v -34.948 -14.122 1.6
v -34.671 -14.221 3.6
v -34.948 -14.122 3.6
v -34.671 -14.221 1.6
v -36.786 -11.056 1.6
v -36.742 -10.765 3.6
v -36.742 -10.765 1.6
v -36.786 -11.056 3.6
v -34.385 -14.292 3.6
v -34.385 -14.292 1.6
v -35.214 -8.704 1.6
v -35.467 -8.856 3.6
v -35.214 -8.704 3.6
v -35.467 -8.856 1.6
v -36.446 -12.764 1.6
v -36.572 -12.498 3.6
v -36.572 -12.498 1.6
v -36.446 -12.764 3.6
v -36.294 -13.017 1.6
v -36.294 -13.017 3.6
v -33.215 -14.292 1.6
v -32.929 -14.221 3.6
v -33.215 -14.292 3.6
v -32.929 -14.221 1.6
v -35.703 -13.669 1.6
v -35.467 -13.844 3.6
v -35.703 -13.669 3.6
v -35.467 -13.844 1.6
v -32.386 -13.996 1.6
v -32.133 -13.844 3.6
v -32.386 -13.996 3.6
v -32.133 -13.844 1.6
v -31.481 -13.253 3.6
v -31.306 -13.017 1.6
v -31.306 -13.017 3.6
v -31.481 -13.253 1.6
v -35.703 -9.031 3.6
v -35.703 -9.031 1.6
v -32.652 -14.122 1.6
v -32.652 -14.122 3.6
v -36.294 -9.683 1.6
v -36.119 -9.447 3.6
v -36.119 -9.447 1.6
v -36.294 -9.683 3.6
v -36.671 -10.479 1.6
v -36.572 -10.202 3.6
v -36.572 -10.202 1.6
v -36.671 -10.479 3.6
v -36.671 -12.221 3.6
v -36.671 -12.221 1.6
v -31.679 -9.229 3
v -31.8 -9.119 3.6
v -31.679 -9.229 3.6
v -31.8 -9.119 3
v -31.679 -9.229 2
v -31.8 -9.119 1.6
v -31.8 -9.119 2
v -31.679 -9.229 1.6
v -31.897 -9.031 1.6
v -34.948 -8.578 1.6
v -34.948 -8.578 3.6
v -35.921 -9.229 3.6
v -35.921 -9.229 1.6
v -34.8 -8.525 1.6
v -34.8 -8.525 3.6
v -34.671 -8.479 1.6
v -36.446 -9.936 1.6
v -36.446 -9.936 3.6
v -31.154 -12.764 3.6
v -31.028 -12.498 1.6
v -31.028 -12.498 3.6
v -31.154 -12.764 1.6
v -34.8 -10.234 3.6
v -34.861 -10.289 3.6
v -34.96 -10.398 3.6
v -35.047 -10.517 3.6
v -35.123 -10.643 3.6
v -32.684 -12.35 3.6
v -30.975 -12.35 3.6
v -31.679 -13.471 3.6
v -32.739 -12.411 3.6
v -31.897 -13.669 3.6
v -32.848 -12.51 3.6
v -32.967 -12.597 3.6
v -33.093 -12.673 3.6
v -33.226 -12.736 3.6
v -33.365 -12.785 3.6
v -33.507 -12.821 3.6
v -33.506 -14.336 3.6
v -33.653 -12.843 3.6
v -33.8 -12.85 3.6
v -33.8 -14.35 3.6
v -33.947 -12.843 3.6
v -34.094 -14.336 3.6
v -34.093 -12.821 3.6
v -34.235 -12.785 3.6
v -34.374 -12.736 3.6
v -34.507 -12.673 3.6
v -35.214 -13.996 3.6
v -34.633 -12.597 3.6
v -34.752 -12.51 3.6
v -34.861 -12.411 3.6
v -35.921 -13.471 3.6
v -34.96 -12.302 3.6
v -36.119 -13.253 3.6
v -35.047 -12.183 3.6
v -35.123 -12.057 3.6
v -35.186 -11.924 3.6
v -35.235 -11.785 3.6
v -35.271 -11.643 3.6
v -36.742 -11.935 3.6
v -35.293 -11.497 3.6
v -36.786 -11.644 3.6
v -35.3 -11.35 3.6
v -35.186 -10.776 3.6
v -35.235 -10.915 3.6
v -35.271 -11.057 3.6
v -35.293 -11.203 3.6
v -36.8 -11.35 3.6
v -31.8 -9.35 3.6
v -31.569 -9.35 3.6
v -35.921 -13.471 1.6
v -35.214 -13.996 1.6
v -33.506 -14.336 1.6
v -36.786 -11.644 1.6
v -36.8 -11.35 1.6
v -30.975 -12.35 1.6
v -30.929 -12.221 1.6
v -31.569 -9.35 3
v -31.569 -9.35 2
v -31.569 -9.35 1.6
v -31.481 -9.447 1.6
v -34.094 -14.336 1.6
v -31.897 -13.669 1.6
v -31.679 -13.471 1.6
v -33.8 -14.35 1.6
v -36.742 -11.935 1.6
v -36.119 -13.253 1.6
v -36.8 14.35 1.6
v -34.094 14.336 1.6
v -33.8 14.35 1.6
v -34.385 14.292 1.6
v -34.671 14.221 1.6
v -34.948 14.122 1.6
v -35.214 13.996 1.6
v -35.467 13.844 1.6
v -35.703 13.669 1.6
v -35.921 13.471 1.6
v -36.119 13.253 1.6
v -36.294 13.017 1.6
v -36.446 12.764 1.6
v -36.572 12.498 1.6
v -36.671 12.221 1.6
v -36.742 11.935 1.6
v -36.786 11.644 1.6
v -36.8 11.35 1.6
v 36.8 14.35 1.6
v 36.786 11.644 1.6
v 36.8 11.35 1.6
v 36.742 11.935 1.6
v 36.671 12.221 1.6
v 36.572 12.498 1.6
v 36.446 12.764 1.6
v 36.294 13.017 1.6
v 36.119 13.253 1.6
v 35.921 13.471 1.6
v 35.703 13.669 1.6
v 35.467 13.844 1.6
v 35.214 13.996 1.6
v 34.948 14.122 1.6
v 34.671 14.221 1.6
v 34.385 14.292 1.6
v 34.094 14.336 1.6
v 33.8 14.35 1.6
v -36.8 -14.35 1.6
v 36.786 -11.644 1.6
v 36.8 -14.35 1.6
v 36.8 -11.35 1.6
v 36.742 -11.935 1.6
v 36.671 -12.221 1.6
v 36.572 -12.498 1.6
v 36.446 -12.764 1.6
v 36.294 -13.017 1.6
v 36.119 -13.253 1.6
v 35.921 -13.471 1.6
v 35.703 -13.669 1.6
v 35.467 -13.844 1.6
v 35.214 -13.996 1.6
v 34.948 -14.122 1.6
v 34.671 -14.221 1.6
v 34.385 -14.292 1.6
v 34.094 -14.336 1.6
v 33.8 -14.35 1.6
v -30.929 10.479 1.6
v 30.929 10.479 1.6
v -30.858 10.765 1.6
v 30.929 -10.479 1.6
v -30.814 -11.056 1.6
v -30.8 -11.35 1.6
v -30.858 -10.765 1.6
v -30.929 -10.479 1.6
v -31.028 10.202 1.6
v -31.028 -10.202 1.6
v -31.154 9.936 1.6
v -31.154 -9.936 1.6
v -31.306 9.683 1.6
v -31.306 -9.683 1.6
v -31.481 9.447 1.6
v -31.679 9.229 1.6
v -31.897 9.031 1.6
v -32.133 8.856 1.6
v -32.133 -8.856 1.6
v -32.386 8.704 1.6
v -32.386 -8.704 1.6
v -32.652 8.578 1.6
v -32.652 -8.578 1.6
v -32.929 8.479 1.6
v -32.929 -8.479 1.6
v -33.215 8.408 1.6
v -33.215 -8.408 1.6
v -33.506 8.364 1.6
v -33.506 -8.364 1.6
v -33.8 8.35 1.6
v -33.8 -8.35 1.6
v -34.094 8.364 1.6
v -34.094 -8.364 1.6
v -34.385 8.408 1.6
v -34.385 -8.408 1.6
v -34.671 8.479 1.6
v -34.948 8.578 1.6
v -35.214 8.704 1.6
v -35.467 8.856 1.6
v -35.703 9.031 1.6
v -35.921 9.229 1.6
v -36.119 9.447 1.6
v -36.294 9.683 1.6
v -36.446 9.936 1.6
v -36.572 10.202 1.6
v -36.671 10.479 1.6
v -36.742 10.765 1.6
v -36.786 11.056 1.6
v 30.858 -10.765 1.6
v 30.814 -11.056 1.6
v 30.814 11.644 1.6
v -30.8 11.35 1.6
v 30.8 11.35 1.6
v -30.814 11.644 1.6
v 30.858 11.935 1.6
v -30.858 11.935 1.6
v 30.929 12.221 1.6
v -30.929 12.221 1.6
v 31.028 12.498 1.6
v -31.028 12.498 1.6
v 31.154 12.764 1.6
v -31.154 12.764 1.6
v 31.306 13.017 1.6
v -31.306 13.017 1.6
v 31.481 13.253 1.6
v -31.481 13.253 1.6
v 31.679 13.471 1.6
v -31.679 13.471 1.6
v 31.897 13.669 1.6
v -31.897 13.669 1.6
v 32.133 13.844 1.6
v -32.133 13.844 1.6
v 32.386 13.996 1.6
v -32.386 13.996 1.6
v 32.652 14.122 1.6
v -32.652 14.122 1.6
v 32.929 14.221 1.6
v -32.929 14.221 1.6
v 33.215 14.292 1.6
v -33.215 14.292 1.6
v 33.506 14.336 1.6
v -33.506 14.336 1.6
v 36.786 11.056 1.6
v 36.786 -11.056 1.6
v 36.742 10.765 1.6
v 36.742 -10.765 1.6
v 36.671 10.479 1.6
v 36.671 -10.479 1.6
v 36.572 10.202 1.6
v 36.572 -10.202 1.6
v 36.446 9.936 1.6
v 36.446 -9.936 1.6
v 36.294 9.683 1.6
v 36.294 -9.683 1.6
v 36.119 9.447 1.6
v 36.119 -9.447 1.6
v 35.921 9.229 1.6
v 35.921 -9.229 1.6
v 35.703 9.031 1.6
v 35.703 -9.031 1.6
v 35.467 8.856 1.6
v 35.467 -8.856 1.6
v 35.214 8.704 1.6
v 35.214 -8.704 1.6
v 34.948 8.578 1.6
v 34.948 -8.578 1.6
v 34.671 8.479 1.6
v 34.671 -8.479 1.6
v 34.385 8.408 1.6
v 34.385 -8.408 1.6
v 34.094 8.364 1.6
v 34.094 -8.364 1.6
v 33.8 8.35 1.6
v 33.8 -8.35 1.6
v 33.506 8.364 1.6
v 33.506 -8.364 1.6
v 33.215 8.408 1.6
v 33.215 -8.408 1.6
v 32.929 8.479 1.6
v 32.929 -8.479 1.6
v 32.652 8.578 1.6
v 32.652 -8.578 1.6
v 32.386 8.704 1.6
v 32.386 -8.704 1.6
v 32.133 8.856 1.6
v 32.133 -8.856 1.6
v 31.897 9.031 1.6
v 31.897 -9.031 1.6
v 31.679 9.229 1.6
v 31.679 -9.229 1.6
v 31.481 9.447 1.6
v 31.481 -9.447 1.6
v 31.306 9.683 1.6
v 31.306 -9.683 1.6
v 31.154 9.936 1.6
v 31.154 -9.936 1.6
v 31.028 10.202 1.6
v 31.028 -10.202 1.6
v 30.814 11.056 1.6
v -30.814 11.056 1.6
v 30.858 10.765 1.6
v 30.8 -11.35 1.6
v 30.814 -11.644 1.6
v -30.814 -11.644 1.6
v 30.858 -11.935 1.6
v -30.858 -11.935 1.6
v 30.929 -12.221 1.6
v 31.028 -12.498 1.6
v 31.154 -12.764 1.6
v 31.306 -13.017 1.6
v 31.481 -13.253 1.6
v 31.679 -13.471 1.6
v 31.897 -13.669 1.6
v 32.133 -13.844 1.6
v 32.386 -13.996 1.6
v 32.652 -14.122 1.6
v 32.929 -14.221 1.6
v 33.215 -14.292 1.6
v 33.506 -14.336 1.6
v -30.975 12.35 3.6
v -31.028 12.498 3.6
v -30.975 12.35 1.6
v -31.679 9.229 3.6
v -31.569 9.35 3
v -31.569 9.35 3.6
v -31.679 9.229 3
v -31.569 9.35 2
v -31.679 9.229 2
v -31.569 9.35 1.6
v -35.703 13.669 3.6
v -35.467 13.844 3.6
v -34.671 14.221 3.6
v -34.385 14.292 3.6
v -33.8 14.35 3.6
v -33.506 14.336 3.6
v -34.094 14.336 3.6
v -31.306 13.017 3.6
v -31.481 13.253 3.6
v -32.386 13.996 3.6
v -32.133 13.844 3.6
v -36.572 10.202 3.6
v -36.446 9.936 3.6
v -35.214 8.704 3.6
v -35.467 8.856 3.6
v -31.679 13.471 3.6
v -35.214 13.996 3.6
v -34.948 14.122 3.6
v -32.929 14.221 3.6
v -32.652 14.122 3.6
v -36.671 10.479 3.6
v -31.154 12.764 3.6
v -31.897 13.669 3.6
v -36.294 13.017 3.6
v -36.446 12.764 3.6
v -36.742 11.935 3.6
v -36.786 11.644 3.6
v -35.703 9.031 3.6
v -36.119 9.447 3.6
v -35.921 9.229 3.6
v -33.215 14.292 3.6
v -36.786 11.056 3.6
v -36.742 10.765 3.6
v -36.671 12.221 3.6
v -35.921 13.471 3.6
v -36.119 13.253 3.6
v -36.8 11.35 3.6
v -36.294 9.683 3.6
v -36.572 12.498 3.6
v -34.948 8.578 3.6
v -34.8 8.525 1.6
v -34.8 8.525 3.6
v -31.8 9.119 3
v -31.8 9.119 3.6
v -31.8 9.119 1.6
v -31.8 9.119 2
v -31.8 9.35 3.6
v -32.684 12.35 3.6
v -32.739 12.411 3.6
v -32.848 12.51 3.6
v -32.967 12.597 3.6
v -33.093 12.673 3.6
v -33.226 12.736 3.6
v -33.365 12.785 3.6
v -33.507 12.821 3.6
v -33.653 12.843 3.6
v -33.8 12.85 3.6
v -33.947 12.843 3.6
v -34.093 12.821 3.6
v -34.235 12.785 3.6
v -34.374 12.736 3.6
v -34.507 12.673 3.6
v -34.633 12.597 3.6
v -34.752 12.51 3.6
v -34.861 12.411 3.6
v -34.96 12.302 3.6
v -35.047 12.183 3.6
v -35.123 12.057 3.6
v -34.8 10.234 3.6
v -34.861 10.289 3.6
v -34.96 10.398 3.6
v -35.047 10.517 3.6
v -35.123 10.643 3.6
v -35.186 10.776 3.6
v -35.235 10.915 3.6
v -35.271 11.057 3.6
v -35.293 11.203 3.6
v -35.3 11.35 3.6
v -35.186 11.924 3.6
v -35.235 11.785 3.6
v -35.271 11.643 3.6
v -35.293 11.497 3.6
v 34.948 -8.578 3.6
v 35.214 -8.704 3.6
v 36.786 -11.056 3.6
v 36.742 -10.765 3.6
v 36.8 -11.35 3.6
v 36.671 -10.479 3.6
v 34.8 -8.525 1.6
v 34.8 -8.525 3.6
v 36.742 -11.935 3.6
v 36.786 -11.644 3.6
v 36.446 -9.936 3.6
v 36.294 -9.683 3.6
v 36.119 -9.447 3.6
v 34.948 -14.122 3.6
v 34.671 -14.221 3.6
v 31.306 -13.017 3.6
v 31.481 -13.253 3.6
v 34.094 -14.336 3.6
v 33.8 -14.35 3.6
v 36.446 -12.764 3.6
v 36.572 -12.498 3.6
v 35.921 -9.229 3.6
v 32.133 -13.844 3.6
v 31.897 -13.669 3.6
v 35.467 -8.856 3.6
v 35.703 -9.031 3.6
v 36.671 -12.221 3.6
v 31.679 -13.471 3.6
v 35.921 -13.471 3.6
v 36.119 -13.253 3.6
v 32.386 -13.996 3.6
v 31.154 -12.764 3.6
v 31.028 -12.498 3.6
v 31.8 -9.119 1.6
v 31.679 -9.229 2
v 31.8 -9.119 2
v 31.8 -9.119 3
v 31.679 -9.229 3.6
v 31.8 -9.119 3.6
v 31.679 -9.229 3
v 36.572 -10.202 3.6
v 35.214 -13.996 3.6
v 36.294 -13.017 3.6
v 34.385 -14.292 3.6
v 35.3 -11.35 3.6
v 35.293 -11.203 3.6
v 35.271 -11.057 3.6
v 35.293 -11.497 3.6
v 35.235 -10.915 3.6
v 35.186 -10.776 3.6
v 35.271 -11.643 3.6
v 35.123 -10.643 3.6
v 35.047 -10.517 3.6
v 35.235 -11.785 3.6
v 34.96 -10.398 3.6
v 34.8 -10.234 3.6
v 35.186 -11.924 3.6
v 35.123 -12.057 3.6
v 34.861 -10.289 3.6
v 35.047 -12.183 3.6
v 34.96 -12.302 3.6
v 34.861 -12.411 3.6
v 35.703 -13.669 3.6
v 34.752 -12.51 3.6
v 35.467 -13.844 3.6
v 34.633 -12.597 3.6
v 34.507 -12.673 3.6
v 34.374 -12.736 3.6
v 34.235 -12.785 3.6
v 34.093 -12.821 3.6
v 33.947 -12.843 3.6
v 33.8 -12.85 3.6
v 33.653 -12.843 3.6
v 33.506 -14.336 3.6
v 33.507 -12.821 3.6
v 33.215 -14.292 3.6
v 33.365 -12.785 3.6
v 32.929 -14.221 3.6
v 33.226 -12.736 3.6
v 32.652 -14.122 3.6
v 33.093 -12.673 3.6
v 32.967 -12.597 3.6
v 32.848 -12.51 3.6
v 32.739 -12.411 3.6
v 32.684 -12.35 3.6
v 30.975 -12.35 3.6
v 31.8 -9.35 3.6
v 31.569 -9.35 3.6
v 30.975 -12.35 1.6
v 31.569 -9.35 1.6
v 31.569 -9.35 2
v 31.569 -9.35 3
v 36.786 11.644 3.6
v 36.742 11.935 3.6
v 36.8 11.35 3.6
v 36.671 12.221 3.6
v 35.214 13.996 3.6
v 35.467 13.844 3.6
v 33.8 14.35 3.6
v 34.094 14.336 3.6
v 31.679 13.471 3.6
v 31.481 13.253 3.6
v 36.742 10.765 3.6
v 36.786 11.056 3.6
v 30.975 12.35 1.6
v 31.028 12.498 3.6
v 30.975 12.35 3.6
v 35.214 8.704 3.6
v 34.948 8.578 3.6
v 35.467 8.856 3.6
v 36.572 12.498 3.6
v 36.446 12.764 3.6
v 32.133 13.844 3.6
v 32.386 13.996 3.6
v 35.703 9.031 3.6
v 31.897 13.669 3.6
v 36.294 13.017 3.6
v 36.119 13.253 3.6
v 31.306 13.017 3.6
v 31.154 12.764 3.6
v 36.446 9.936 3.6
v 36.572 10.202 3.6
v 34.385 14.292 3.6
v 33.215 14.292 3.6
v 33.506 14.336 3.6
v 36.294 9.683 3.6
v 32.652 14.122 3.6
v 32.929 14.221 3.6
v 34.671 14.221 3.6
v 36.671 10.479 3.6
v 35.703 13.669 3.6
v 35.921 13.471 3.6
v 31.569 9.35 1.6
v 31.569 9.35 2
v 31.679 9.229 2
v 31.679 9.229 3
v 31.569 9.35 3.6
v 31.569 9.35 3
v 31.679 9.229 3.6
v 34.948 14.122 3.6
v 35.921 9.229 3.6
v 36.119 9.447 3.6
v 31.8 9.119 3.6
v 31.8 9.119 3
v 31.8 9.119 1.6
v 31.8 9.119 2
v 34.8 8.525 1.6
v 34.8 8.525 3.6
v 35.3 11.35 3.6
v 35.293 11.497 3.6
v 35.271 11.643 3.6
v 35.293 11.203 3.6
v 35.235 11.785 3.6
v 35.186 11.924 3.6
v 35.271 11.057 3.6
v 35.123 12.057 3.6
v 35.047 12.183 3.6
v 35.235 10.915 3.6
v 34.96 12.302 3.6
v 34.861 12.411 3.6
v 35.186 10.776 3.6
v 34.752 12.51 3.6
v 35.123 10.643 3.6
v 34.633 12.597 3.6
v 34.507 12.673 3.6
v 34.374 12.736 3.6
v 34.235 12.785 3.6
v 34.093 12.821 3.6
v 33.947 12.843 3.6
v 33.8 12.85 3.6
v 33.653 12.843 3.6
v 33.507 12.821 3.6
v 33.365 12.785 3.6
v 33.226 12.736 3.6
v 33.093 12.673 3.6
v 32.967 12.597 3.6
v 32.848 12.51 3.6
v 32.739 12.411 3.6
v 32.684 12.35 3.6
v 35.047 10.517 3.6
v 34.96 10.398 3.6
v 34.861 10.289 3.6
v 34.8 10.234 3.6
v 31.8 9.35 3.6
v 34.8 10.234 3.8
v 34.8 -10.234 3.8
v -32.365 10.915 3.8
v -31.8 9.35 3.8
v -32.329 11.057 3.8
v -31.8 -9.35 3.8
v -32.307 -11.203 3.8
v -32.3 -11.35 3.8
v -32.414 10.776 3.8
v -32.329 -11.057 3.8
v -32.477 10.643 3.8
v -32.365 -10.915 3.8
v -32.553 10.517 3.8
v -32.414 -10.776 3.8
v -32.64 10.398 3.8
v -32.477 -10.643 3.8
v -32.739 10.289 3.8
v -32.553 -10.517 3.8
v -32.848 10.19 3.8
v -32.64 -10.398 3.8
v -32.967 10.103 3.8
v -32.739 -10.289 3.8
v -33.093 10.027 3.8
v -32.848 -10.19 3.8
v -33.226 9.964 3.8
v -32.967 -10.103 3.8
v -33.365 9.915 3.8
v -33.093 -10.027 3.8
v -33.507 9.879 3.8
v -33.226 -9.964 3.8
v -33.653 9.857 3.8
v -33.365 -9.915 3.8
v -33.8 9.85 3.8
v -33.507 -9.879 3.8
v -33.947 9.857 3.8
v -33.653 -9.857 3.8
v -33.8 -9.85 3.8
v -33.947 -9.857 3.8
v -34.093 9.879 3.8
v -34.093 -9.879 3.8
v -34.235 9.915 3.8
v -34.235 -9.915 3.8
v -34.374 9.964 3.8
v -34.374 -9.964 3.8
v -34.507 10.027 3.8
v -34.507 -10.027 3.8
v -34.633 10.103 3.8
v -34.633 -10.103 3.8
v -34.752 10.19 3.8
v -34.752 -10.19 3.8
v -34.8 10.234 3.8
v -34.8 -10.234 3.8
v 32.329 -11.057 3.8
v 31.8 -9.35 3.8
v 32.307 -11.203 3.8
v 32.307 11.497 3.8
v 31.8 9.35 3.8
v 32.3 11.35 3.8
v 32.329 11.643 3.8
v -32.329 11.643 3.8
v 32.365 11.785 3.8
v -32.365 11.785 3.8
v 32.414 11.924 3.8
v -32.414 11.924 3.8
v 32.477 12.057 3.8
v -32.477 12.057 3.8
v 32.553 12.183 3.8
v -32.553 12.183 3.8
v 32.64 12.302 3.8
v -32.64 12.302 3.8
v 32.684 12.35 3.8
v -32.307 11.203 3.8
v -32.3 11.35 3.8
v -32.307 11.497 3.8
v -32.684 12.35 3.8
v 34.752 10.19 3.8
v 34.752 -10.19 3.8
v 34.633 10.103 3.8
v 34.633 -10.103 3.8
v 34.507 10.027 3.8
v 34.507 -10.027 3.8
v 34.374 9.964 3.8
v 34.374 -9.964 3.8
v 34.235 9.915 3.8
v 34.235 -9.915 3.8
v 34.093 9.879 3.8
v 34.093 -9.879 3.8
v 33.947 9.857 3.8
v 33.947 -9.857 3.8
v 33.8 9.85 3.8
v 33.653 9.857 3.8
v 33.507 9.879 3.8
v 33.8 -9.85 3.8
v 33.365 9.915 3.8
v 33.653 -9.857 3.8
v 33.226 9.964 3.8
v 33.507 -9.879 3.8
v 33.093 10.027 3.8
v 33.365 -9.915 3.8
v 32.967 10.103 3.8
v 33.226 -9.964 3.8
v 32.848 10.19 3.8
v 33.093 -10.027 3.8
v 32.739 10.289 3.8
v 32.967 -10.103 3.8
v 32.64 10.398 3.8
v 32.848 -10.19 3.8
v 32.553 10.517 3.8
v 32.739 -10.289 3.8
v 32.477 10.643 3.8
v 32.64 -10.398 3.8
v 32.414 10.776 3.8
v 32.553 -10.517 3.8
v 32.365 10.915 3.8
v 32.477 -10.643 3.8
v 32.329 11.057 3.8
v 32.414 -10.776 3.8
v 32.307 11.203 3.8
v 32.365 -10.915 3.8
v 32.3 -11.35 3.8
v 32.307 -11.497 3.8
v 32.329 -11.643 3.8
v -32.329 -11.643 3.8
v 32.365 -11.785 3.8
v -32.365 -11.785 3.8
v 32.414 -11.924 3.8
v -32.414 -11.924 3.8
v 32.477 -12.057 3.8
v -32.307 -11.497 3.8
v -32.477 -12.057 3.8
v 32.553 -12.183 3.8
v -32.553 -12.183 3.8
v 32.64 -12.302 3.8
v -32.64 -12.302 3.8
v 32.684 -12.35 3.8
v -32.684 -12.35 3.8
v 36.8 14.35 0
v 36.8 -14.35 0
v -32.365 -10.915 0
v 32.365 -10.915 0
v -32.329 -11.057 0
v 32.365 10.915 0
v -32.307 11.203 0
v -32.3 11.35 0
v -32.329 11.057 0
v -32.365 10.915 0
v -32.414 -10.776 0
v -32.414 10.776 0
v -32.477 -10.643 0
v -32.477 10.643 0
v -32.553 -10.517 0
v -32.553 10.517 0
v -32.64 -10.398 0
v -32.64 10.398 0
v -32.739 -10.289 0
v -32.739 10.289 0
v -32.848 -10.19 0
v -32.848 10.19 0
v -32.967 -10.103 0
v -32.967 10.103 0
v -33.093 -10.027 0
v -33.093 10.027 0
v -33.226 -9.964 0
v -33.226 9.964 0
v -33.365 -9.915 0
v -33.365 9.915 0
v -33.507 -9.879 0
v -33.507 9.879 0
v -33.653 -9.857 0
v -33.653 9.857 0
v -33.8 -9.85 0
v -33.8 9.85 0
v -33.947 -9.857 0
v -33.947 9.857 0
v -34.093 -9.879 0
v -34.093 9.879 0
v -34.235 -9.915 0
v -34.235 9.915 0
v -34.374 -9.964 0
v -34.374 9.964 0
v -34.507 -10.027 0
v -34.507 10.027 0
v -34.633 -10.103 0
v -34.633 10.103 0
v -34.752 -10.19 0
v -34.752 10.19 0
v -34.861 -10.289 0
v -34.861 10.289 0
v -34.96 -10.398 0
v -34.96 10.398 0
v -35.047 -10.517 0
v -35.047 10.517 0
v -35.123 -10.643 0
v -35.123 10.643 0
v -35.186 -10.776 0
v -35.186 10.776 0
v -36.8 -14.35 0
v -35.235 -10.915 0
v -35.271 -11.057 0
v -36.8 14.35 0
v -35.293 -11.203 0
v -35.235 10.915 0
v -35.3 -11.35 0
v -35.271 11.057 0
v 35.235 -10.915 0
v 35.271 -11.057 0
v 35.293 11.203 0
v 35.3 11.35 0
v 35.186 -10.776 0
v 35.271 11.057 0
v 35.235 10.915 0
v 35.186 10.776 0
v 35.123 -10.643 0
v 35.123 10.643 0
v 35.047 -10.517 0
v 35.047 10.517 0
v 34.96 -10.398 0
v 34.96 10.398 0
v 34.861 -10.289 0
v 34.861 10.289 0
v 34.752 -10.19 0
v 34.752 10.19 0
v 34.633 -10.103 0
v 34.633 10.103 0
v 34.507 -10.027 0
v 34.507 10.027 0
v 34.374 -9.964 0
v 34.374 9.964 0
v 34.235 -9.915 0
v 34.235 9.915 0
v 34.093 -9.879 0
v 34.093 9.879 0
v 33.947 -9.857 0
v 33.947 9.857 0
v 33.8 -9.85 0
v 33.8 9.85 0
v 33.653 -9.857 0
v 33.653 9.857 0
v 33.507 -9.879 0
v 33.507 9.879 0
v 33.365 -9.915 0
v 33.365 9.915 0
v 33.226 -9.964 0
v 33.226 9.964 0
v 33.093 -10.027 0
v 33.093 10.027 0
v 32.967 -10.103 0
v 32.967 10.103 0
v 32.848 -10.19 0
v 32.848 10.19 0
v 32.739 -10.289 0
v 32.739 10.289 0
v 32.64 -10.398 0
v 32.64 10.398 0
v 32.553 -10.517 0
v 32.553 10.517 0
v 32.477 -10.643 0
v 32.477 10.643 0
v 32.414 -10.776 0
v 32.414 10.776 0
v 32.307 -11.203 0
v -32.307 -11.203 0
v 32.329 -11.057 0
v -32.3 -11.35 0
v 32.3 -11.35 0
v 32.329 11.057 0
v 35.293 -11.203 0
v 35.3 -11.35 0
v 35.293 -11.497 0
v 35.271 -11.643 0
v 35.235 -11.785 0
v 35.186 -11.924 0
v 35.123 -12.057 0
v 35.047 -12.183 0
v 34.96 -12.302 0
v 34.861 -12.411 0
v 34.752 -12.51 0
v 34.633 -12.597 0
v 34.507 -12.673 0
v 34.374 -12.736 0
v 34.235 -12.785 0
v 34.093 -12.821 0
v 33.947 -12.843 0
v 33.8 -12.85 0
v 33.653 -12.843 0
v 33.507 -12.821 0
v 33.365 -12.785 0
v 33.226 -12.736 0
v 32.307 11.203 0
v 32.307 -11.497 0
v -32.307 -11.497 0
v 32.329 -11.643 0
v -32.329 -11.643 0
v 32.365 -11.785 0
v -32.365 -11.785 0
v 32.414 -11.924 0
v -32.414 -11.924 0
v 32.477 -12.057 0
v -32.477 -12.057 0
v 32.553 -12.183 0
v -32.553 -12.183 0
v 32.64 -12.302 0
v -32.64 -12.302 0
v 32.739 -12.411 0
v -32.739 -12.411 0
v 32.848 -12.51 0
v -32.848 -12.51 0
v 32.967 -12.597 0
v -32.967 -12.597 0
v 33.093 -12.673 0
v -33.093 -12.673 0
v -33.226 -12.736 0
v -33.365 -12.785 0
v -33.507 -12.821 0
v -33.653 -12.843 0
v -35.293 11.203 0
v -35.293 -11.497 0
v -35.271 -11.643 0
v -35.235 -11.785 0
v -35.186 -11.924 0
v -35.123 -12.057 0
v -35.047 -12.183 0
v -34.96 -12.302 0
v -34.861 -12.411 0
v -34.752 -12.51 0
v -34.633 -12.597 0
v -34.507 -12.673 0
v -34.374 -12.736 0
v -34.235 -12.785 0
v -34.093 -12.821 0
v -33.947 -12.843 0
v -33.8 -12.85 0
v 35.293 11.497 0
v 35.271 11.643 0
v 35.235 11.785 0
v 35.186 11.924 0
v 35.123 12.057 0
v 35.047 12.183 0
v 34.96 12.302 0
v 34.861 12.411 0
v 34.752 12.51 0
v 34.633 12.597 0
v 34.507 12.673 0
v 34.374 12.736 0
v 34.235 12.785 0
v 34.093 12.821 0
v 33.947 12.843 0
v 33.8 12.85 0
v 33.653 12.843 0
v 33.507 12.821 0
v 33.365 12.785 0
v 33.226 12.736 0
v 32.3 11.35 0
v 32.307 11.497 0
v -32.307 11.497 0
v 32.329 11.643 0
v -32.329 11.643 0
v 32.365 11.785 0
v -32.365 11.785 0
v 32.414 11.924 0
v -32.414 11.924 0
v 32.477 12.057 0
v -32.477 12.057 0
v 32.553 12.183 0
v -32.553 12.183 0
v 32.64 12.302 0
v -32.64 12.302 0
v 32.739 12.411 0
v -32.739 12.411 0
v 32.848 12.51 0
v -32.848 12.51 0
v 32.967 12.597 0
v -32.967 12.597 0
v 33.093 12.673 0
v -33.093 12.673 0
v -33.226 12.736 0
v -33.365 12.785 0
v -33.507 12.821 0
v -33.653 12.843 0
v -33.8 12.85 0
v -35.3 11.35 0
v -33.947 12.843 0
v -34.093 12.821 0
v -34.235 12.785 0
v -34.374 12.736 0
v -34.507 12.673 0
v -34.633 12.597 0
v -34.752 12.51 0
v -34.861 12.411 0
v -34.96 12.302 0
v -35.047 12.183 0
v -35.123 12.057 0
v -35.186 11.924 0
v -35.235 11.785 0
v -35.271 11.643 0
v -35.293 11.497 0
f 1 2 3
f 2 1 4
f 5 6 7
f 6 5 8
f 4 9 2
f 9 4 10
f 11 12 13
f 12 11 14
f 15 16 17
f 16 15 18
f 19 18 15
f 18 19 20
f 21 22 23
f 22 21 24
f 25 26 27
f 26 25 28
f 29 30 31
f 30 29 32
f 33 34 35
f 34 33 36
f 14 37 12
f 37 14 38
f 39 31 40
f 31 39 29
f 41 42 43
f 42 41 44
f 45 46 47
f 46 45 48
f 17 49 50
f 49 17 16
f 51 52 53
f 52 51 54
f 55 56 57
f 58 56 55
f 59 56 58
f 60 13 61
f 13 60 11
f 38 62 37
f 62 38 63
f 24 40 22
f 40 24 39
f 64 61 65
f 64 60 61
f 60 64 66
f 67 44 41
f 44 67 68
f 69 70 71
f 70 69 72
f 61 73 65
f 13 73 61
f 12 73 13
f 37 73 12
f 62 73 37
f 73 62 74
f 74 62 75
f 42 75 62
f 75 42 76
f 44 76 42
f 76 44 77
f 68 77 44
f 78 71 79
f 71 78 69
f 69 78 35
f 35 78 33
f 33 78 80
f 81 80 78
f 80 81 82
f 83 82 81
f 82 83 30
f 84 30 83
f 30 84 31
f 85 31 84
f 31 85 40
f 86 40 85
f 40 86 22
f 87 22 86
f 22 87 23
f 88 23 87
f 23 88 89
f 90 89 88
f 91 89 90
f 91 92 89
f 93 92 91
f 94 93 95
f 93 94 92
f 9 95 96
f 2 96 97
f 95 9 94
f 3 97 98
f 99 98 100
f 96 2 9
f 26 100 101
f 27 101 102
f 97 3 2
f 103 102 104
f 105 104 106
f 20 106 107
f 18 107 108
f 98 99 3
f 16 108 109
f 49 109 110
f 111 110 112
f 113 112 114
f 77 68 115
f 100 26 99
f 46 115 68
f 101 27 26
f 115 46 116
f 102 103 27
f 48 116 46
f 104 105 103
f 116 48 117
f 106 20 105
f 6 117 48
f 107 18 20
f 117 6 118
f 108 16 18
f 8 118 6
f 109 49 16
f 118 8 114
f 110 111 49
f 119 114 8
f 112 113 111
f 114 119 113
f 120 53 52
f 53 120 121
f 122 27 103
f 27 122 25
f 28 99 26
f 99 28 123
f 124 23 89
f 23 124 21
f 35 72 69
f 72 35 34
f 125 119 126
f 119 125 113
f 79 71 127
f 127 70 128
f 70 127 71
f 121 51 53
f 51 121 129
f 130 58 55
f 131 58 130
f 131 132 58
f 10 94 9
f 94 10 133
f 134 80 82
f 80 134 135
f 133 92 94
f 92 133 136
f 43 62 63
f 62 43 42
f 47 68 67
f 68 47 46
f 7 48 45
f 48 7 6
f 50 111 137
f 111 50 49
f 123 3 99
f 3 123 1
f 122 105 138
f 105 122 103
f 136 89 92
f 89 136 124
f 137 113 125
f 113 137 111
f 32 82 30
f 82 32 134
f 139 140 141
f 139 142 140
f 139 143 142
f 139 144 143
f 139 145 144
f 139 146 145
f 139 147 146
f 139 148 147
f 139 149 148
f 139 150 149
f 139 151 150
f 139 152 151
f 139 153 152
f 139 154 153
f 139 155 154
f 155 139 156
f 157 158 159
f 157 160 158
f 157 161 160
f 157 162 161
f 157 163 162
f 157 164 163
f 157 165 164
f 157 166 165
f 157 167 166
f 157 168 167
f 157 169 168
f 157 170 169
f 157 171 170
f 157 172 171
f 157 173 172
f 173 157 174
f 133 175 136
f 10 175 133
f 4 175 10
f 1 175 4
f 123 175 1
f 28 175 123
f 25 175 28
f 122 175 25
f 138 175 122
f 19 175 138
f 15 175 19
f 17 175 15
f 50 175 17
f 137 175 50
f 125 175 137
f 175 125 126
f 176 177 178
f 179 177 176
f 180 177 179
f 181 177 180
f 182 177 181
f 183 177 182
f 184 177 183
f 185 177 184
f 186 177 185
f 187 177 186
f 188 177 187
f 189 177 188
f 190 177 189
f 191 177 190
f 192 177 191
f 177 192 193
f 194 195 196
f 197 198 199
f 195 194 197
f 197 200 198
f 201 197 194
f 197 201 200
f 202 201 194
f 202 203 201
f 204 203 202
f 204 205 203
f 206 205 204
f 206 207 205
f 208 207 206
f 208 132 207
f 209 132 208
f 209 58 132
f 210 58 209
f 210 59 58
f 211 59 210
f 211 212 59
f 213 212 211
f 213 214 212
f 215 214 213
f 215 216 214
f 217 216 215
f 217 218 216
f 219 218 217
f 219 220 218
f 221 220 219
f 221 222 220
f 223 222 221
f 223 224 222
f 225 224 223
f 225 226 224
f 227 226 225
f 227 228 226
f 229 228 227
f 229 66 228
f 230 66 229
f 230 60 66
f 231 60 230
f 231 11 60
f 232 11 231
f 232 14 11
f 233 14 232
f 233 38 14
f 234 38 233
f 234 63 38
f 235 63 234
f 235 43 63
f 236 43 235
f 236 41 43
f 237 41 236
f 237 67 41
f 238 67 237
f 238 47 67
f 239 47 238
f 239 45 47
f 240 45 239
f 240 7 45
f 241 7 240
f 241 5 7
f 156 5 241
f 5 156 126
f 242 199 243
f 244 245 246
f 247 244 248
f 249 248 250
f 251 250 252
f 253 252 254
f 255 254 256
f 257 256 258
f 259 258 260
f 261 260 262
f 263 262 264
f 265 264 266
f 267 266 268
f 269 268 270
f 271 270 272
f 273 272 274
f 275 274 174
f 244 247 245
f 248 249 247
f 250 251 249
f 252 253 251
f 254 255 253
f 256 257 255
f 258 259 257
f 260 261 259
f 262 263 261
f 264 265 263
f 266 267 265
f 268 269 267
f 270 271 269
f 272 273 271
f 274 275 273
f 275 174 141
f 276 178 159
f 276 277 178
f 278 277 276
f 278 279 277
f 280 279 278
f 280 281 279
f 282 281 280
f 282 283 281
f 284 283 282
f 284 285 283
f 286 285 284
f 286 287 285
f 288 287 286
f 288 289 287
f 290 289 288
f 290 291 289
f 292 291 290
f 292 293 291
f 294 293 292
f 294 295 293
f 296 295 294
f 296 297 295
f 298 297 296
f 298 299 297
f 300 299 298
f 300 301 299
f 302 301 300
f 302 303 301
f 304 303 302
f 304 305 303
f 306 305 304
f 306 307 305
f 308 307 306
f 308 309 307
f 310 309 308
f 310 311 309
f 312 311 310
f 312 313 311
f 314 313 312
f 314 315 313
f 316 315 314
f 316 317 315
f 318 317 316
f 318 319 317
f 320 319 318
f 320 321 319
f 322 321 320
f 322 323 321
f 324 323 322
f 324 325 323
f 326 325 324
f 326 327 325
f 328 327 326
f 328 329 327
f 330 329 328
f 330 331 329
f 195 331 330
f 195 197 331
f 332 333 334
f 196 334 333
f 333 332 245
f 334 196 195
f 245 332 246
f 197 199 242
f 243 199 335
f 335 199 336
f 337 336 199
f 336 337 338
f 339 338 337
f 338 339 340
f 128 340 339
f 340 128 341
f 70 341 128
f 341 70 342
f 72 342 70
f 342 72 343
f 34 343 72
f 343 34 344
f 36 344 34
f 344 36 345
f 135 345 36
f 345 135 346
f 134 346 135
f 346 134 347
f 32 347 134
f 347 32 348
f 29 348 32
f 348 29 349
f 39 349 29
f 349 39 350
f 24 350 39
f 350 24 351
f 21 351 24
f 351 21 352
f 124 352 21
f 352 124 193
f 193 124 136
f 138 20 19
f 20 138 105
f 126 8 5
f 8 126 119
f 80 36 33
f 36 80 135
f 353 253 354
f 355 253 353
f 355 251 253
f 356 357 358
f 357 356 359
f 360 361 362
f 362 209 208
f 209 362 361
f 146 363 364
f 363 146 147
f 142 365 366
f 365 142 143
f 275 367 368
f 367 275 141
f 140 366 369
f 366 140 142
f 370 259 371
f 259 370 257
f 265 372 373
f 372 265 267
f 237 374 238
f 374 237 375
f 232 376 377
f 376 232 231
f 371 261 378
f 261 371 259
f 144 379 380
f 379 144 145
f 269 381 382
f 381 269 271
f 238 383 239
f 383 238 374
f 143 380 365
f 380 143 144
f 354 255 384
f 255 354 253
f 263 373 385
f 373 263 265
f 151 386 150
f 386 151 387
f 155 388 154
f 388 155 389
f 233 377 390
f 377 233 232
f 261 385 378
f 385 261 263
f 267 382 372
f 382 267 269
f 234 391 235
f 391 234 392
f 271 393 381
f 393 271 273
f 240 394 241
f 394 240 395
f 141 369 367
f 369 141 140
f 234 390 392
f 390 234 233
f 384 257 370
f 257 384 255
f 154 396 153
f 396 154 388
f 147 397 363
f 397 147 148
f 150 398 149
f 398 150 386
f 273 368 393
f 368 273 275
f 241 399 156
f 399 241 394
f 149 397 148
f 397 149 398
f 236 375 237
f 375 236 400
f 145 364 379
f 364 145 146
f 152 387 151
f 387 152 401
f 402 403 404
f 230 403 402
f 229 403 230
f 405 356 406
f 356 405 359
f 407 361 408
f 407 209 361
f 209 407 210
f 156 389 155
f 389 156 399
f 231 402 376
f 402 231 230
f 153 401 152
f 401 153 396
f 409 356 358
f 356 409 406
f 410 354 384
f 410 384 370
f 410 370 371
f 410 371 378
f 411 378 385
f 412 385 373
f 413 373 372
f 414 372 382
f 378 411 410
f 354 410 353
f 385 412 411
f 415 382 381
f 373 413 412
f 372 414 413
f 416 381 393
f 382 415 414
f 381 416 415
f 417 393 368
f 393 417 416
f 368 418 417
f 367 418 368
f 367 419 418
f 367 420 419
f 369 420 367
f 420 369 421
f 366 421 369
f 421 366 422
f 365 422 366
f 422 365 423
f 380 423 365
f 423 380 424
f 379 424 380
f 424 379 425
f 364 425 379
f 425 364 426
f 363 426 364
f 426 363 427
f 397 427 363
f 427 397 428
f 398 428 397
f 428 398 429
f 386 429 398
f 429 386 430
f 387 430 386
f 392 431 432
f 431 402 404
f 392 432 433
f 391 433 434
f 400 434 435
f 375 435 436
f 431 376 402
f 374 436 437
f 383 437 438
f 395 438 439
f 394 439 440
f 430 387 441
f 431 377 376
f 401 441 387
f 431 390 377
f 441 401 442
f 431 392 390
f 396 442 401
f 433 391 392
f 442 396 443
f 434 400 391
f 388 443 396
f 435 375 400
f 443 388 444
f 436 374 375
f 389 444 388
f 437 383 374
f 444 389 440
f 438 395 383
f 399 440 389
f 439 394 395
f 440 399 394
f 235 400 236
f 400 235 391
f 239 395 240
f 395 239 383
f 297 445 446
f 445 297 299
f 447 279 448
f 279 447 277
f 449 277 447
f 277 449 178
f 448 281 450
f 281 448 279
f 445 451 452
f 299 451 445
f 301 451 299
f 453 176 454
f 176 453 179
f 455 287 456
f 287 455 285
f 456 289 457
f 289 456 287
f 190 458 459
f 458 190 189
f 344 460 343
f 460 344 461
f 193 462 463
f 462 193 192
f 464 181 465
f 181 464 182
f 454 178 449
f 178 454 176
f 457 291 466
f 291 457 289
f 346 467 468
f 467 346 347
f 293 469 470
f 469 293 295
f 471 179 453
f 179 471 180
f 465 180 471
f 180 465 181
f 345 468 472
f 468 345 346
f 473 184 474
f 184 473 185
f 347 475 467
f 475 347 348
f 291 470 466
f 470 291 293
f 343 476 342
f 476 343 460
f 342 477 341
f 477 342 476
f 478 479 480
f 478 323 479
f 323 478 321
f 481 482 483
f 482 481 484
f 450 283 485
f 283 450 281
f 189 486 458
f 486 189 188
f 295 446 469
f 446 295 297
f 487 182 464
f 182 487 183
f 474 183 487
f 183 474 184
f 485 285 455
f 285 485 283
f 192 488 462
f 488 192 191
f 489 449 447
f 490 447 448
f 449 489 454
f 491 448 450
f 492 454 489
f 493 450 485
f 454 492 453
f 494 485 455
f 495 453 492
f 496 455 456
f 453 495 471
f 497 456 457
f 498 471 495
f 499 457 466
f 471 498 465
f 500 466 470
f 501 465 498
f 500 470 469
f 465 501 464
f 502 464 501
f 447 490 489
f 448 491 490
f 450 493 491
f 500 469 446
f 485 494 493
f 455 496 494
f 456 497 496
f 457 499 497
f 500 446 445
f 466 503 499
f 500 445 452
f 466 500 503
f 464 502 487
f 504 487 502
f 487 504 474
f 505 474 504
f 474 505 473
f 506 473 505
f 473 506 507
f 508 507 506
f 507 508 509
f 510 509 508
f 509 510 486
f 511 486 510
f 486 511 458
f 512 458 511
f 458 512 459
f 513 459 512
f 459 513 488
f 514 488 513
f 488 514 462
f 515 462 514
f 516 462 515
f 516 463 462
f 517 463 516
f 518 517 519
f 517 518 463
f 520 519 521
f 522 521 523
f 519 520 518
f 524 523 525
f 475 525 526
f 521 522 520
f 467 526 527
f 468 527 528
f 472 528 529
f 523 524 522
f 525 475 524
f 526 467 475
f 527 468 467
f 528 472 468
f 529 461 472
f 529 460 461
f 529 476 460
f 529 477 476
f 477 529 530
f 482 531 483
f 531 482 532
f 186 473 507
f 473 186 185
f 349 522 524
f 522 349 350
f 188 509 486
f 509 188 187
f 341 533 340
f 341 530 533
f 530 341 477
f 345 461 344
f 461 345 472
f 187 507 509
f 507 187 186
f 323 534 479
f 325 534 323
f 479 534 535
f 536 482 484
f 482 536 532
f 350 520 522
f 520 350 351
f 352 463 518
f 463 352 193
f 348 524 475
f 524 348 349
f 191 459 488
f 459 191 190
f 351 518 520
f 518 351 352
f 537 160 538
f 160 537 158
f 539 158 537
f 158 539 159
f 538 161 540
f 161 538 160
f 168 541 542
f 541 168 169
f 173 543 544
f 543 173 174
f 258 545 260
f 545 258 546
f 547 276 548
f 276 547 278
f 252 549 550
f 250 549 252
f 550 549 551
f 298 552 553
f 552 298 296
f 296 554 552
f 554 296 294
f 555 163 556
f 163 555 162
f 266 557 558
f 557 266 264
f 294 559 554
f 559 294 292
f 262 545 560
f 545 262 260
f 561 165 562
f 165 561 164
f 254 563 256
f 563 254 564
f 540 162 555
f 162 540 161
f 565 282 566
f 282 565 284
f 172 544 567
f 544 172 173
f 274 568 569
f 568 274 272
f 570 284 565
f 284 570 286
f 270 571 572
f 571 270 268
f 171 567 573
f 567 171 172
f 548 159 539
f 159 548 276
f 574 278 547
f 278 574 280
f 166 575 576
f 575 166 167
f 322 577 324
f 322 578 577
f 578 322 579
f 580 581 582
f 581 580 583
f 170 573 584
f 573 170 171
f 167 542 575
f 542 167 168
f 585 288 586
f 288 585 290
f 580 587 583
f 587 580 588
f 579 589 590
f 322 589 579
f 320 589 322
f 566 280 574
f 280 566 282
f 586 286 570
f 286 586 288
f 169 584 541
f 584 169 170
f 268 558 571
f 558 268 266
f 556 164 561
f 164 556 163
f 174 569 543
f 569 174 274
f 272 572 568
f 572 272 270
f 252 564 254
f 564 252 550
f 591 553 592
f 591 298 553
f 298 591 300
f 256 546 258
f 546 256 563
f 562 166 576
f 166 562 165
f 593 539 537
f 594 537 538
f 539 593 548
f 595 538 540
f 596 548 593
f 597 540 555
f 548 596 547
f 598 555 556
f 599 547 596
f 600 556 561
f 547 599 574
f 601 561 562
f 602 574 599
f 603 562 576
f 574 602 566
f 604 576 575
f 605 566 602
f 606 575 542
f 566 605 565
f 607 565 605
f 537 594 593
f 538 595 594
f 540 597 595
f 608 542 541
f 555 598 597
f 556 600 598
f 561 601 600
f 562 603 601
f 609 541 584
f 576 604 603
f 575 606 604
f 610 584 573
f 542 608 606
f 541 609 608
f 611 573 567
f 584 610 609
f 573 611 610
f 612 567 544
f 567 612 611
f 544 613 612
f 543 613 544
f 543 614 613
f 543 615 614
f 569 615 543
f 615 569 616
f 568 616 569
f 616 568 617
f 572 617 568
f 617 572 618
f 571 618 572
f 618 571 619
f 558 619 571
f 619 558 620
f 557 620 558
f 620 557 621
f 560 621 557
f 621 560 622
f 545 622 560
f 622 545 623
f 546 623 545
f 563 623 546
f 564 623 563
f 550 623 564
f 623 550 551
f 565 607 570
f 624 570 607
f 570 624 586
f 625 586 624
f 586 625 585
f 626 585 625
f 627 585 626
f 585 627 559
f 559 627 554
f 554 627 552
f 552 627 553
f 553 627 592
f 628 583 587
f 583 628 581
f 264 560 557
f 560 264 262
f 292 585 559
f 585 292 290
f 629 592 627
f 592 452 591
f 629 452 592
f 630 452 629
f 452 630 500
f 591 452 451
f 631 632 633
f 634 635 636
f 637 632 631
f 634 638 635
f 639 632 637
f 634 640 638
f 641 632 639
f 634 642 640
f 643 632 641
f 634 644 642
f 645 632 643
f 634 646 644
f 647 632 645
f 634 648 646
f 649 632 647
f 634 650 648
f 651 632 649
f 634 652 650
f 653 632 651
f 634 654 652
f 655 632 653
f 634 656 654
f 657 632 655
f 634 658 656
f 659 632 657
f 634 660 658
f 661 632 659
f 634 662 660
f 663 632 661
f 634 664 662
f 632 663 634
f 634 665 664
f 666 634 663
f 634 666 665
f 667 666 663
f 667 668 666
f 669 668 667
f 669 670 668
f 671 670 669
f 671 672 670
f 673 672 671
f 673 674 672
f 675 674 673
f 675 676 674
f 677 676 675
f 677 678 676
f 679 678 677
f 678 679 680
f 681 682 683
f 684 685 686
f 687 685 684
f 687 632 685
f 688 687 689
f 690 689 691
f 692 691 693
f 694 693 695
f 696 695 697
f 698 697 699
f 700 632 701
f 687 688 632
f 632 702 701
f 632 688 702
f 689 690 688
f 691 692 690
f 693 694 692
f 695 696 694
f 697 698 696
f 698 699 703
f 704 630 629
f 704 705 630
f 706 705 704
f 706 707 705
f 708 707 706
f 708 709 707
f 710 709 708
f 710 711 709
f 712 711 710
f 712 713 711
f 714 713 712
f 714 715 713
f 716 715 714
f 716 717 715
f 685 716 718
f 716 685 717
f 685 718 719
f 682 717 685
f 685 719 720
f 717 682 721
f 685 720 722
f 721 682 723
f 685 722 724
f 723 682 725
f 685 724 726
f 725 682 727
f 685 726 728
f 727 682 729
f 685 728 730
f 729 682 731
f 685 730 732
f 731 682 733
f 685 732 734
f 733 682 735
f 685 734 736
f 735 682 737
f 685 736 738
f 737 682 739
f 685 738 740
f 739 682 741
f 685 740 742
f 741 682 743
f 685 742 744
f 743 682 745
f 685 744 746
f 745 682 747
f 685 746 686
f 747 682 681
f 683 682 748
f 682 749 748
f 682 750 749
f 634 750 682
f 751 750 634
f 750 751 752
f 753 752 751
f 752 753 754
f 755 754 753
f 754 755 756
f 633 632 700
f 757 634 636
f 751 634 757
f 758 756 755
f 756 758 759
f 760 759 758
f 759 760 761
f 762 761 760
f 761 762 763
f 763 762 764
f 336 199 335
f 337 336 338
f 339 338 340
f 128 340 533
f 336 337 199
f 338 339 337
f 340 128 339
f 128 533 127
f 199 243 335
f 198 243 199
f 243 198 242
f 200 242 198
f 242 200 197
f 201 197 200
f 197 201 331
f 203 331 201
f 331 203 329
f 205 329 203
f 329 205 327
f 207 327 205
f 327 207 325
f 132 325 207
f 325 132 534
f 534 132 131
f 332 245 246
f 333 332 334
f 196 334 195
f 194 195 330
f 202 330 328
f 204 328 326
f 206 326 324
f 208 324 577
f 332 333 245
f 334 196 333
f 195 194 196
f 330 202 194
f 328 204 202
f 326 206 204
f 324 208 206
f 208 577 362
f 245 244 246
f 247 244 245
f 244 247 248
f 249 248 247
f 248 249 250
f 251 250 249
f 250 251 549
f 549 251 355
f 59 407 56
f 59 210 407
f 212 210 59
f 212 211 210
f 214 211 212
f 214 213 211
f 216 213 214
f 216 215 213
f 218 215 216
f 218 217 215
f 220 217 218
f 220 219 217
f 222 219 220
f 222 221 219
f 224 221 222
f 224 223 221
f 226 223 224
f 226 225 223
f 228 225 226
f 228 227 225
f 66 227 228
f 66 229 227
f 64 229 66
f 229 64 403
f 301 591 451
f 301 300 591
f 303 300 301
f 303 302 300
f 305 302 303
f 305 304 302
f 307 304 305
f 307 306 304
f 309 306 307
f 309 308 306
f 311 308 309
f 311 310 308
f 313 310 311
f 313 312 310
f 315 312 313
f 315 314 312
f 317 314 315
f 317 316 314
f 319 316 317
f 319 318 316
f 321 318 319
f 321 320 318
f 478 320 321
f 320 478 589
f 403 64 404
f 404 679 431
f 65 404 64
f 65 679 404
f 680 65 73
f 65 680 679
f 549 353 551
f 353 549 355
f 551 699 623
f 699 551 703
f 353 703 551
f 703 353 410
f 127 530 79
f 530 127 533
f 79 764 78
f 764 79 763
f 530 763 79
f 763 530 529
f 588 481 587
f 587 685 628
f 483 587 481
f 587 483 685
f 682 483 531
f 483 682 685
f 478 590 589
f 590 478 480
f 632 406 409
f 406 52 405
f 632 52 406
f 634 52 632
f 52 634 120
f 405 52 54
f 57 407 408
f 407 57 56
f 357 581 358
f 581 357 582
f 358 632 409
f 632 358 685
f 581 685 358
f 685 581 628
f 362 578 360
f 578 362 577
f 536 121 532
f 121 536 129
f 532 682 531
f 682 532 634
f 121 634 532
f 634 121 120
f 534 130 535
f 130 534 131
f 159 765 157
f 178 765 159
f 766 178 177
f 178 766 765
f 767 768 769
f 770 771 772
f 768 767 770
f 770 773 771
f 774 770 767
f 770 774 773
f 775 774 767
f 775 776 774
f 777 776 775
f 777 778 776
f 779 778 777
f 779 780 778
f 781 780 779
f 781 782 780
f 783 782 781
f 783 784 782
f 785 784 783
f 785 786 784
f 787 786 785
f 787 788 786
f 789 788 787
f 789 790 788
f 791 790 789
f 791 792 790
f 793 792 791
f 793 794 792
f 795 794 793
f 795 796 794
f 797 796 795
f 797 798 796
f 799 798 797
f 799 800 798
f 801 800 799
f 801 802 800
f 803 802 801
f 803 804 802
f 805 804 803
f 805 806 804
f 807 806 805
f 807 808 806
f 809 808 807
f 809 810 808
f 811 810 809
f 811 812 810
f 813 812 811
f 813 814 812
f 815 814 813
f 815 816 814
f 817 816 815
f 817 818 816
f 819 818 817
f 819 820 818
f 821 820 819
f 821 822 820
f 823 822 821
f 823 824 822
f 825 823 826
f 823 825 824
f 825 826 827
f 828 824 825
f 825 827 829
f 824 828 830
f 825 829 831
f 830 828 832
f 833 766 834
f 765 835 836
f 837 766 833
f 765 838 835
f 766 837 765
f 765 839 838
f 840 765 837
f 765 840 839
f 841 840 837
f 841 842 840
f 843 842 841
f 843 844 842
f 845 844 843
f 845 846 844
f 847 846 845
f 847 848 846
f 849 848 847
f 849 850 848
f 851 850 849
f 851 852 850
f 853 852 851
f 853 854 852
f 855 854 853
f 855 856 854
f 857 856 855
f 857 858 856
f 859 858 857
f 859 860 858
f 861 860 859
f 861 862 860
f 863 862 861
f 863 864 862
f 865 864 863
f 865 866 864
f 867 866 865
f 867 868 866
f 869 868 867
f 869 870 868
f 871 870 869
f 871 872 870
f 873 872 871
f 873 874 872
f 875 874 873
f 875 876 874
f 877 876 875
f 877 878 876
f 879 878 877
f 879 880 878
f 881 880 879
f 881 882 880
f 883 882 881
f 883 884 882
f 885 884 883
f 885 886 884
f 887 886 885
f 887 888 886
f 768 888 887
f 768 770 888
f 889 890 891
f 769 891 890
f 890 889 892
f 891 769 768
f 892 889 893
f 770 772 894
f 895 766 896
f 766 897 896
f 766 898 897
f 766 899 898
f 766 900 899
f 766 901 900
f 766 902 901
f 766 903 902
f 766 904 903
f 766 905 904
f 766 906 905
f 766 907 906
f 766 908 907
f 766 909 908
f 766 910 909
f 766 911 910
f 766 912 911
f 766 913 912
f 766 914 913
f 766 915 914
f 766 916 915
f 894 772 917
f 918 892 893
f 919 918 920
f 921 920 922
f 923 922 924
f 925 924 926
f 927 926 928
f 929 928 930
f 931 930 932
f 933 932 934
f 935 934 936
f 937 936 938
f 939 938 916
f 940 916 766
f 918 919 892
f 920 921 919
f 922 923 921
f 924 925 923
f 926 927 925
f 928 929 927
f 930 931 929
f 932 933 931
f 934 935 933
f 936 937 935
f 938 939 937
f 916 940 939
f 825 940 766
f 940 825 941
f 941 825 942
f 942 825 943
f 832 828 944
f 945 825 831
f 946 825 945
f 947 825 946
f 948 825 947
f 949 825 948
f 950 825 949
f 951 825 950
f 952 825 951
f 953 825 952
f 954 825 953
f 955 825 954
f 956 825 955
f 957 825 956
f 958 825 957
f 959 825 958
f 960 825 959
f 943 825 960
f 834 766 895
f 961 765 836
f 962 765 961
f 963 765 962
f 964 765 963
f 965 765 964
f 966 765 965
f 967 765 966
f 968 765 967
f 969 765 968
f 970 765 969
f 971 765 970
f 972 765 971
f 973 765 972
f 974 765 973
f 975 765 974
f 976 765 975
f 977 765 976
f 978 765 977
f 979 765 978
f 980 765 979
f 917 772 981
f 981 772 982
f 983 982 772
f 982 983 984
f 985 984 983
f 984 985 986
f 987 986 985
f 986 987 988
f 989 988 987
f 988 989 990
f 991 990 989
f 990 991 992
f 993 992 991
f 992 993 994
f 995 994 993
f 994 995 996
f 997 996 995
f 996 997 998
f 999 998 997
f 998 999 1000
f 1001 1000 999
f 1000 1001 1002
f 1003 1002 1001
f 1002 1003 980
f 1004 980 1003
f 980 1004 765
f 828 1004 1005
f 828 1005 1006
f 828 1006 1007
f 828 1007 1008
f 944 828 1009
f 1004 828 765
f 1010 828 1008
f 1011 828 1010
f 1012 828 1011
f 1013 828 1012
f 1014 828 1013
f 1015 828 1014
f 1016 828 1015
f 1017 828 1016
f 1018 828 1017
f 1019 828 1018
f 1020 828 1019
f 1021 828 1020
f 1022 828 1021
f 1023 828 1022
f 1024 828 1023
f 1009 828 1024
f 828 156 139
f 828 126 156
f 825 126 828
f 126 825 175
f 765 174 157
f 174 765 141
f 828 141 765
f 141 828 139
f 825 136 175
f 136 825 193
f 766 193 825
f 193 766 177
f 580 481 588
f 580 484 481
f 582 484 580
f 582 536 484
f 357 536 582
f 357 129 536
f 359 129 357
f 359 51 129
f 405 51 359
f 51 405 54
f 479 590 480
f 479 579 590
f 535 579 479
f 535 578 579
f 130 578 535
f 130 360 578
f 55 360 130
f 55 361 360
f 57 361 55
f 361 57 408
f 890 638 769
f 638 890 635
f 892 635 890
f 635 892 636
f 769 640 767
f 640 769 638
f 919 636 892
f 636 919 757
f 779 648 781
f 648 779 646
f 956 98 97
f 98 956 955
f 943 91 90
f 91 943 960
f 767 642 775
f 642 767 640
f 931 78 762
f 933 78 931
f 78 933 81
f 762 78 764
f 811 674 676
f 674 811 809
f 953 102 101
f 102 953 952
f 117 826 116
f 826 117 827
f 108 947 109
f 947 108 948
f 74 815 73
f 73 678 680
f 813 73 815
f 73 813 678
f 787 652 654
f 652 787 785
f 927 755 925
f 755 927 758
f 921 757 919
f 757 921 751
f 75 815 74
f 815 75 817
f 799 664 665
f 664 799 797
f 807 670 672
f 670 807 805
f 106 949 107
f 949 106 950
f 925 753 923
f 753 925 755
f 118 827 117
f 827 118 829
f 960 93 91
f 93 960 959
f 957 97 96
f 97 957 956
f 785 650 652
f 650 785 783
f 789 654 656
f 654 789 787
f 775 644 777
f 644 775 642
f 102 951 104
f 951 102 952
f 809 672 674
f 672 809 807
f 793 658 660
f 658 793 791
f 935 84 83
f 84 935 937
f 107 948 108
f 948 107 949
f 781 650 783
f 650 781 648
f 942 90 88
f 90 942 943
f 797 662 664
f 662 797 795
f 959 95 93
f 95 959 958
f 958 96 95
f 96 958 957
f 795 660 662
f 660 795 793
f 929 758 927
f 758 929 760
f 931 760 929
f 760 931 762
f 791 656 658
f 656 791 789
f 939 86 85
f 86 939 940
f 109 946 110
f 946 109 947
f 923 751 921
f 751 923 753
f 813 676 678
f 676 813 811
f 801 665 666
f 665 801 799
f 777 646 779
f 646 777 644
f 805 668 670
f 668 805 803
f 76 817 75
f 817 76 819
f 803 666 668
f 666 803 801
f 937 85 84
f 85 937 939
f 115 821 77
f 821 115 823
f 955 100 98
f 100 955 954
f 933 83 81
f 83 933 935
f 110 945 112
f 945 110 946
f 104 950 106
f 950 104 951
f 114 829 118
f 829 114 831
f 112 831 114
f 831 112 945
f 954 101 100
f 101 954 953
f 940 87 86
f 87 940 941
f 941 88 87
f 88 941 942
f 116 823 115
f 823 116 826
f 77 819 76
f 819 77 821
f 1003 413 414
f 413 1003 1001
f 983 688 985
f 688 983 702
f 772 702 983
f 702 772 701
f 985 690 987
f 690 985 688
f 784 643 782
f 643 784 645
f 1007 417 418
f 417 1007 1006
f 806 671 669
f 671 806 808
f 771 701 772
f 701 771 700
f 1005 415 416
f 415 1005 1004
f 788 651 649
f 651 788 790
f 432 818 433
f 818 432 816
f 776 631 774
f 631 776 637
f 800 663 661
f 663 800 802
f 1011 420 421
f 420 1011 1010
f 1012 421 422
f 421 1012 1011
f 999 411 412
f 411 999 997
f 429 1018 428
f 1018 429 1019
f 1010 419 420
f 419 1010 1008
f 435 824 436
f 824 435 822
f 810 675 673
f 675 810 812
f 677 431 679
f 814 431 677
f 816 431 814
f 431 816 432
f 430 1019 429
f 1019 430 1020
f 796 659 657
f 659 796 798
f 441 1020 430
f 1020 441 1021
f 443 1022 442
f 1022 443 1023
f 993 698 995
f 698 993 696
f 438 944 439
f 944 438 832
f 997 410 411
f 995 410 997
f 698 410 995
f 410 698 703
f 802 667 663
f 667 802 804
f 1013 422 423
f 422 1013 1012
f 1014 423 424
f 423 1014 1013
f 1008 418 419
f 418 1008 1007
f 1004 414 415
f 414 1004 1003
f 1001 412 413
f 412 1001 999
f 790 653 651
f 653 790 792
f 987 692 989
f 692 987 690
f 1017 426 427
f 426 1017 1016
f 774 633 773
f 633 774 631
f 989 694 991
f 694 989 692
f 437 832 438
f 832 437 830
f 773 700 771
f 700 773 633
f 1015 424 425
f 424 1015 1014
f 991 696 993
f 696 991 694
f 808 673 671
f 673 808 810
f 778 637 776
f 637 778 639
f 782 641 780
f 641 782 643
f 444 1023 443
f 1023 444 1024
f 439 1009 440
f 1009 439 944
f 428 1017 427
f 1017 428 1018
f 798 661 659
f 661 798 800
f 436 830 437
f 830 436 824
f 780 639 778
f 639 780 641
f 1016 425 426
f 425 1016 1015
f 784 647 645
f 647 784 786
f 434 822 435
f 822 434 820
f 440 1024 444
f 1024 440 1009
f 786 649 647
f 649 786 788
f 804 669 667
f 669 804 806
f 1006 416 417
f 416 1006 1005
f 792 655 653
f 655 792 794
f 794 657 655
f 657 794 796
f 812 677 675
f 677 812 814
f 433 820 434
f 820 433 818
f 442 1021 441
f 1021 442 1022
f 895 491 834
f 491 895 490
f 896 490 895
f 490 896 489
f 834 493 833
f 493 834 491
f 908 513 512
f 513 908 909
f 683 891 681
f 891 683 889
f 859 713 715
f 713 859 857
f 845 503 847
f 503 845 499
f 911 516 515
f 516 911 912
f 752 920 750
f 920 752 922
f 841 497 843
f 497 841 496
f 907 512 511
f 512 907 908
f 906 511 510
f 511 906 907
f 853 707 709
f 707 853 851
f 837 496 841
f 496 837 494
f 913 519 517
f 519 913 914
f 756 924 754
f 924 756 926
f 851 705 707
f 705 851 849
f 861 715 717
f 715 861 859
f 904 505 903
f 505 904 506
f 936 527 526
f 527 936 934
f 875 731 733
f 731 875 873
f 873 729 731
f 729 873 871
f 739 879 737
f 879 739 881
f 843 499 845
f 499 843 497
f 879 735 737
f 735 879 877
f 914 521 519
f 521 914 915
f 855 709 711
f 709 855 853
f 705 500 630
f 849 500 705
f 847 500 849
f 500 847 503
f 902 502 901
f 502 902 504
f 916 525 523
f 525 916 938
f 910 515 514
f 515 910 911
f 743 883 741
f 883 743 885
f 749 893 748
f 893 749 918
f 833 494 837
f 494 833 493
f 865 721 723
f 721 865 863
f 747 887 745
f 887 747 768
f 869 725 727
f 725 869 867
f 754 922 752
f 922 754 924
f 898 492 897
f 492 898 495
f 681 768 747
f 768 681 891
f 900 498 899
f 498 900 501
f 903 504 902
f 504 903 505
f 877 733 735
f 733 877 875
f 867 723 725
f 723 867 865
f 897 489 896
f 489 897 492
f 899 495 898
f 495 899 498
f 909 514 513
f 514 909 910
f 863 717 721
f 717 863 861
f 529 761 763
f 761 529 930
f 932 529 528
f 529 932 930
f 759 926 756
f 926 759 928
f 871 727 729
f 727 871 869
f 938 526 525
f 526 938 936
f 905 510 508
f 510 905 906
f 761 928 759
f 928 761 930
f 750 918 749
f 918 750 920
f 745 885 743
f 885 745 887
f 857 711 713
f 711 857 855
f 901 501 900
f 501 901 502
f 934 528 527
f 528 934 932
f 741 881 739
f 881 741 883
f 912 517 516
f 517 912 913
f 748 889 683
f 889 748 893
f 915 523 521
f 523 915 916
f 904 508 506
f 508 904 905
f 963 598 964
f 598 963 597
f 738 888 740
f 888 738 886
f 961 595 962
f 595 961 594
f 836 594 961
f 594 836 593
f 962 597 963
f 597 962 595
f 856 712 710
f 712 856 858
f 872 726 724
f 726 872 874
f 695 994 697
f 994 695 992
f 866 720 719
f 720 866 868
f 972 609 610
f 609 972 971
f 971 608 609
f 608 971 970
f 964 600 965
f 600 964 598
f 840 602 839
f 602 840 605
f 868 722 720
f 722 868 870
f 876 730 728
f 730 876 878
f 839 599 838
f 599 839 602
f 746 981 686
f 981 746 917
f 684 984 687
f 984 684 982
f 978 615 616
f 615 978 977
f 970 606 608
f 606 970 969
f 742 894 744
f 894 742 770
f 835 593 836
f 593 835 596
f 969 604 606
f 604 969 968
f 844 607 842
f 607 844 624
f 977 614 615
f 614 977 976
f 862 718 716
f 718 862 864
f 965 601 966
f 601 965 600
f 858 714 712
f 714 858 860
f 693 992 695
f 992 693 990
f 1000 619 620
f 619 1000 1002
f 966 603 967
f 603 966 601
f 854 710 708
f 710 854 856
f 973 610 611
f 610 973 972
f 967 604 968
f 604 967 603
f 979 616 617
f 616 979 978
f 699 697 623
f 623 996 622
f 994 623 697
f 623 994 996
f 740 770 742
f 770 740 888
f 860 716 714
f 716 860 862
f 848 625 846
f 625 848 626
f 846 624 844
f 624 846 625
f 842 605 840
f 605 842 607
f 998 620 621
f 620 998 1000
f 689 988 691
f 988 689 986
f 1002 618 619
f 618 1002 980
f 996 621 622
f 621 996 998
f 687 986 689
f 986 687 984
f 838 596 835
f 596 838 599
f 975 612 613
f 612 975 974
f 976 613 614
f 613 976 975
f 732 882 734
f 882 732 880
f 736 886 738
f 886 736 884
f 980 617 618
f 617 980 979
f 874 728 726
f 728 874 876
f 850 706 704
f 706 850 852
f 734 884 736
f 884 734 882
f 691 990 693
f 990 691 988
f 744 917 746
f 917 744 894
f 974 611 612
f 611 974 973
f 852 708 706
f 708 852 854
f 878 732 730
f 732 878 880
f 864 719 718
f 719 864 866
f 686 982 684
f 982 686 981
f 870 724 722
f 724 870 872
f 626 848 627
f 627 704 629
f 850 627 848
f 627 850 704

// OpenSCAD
$fn = 64;

// LCD Display Module S-7282B (approx.)
// Overall: 73.6mm x 28.7mm
// Simple representative model: PCB + bezel + viewing window + 4 mounting holes

module lcd_s_7282b(
    L = 73.6,
    W = 28.7,
    pcb_t = 1.6,
    bezel_t = 2.2,
    bezel_margin = 2.0,
    window_margin = 5.0,
    hole_d = 3.0,
    hole_edge = 3.0,
    standoff_d = 6.0,
    standoff_h = 2.0
){
    // Derived
    bezel_L = L - 2*bezel_margin;
    bezel_W = W - 2*bezel_margin;

    window_L = L - 2*window_margin;
    window_W = W - 2*window_margin;

    // Hole positions (from edges)
    hx = L/2 - hole_edge;
    hy = W/2 - hole_edge;

    module pcb(){
        color([0.05,0.35,0.12])
            translate([-L/2, -W/2, 0])
                cube([L, W, pcb_t], center=false);
    }

    module standoffs(){
        color([0.05,0.05,0.05])
        for (sx = [-1, 1], sy = [-1, 1])
            translate([sx*hx, sy*hy, pcb_t])
                cylinder(d=standoff_d, h=standoff_h);
    }

    module bezel(){
        // Bezel ring with window cutout
        color([0.12,0.12,0.12])
        translate([0,0,pcb_t])
        difference(){
            translate([-bezel_L/2, -bezel_W/2, 0])
                cube([bezel_L, bezel_W, bezel_t], center=false);

            // Window opening
            translate([-window_L/2, -window_W/2, -0.1])
                cube([window_L, window_W, bezel_t+0.2], center=false);
        }
    }

    module glass(){
        // Slightly recessed "glass" in the window
        glass_t = 1.0;
        color([0.05,0.10,0.12, 0.6])
        translate([0,0,pcb_t + 0.4])
            translate([-window_L/2, -window_W/2, 0])
                cube([window_L, window_W, glass_t], center=false);
    }

    module holes(){
        // Through holes in PCB (and standoffs/bezel if overlapping)
        for (sx = [-1, 1], sy = [-1, 1])
            translate([sx*hx, sy*hy, -0.5])
                cylinder(d=hole_d, h=pcb_t + standoff_h + bezel_t + 2.0);
    }

    difference(){
        union(){
            pcb();
            standoffs();
            bezel();
            glass();
        }
        holes();
    }
}

lcd_s_7282b();
